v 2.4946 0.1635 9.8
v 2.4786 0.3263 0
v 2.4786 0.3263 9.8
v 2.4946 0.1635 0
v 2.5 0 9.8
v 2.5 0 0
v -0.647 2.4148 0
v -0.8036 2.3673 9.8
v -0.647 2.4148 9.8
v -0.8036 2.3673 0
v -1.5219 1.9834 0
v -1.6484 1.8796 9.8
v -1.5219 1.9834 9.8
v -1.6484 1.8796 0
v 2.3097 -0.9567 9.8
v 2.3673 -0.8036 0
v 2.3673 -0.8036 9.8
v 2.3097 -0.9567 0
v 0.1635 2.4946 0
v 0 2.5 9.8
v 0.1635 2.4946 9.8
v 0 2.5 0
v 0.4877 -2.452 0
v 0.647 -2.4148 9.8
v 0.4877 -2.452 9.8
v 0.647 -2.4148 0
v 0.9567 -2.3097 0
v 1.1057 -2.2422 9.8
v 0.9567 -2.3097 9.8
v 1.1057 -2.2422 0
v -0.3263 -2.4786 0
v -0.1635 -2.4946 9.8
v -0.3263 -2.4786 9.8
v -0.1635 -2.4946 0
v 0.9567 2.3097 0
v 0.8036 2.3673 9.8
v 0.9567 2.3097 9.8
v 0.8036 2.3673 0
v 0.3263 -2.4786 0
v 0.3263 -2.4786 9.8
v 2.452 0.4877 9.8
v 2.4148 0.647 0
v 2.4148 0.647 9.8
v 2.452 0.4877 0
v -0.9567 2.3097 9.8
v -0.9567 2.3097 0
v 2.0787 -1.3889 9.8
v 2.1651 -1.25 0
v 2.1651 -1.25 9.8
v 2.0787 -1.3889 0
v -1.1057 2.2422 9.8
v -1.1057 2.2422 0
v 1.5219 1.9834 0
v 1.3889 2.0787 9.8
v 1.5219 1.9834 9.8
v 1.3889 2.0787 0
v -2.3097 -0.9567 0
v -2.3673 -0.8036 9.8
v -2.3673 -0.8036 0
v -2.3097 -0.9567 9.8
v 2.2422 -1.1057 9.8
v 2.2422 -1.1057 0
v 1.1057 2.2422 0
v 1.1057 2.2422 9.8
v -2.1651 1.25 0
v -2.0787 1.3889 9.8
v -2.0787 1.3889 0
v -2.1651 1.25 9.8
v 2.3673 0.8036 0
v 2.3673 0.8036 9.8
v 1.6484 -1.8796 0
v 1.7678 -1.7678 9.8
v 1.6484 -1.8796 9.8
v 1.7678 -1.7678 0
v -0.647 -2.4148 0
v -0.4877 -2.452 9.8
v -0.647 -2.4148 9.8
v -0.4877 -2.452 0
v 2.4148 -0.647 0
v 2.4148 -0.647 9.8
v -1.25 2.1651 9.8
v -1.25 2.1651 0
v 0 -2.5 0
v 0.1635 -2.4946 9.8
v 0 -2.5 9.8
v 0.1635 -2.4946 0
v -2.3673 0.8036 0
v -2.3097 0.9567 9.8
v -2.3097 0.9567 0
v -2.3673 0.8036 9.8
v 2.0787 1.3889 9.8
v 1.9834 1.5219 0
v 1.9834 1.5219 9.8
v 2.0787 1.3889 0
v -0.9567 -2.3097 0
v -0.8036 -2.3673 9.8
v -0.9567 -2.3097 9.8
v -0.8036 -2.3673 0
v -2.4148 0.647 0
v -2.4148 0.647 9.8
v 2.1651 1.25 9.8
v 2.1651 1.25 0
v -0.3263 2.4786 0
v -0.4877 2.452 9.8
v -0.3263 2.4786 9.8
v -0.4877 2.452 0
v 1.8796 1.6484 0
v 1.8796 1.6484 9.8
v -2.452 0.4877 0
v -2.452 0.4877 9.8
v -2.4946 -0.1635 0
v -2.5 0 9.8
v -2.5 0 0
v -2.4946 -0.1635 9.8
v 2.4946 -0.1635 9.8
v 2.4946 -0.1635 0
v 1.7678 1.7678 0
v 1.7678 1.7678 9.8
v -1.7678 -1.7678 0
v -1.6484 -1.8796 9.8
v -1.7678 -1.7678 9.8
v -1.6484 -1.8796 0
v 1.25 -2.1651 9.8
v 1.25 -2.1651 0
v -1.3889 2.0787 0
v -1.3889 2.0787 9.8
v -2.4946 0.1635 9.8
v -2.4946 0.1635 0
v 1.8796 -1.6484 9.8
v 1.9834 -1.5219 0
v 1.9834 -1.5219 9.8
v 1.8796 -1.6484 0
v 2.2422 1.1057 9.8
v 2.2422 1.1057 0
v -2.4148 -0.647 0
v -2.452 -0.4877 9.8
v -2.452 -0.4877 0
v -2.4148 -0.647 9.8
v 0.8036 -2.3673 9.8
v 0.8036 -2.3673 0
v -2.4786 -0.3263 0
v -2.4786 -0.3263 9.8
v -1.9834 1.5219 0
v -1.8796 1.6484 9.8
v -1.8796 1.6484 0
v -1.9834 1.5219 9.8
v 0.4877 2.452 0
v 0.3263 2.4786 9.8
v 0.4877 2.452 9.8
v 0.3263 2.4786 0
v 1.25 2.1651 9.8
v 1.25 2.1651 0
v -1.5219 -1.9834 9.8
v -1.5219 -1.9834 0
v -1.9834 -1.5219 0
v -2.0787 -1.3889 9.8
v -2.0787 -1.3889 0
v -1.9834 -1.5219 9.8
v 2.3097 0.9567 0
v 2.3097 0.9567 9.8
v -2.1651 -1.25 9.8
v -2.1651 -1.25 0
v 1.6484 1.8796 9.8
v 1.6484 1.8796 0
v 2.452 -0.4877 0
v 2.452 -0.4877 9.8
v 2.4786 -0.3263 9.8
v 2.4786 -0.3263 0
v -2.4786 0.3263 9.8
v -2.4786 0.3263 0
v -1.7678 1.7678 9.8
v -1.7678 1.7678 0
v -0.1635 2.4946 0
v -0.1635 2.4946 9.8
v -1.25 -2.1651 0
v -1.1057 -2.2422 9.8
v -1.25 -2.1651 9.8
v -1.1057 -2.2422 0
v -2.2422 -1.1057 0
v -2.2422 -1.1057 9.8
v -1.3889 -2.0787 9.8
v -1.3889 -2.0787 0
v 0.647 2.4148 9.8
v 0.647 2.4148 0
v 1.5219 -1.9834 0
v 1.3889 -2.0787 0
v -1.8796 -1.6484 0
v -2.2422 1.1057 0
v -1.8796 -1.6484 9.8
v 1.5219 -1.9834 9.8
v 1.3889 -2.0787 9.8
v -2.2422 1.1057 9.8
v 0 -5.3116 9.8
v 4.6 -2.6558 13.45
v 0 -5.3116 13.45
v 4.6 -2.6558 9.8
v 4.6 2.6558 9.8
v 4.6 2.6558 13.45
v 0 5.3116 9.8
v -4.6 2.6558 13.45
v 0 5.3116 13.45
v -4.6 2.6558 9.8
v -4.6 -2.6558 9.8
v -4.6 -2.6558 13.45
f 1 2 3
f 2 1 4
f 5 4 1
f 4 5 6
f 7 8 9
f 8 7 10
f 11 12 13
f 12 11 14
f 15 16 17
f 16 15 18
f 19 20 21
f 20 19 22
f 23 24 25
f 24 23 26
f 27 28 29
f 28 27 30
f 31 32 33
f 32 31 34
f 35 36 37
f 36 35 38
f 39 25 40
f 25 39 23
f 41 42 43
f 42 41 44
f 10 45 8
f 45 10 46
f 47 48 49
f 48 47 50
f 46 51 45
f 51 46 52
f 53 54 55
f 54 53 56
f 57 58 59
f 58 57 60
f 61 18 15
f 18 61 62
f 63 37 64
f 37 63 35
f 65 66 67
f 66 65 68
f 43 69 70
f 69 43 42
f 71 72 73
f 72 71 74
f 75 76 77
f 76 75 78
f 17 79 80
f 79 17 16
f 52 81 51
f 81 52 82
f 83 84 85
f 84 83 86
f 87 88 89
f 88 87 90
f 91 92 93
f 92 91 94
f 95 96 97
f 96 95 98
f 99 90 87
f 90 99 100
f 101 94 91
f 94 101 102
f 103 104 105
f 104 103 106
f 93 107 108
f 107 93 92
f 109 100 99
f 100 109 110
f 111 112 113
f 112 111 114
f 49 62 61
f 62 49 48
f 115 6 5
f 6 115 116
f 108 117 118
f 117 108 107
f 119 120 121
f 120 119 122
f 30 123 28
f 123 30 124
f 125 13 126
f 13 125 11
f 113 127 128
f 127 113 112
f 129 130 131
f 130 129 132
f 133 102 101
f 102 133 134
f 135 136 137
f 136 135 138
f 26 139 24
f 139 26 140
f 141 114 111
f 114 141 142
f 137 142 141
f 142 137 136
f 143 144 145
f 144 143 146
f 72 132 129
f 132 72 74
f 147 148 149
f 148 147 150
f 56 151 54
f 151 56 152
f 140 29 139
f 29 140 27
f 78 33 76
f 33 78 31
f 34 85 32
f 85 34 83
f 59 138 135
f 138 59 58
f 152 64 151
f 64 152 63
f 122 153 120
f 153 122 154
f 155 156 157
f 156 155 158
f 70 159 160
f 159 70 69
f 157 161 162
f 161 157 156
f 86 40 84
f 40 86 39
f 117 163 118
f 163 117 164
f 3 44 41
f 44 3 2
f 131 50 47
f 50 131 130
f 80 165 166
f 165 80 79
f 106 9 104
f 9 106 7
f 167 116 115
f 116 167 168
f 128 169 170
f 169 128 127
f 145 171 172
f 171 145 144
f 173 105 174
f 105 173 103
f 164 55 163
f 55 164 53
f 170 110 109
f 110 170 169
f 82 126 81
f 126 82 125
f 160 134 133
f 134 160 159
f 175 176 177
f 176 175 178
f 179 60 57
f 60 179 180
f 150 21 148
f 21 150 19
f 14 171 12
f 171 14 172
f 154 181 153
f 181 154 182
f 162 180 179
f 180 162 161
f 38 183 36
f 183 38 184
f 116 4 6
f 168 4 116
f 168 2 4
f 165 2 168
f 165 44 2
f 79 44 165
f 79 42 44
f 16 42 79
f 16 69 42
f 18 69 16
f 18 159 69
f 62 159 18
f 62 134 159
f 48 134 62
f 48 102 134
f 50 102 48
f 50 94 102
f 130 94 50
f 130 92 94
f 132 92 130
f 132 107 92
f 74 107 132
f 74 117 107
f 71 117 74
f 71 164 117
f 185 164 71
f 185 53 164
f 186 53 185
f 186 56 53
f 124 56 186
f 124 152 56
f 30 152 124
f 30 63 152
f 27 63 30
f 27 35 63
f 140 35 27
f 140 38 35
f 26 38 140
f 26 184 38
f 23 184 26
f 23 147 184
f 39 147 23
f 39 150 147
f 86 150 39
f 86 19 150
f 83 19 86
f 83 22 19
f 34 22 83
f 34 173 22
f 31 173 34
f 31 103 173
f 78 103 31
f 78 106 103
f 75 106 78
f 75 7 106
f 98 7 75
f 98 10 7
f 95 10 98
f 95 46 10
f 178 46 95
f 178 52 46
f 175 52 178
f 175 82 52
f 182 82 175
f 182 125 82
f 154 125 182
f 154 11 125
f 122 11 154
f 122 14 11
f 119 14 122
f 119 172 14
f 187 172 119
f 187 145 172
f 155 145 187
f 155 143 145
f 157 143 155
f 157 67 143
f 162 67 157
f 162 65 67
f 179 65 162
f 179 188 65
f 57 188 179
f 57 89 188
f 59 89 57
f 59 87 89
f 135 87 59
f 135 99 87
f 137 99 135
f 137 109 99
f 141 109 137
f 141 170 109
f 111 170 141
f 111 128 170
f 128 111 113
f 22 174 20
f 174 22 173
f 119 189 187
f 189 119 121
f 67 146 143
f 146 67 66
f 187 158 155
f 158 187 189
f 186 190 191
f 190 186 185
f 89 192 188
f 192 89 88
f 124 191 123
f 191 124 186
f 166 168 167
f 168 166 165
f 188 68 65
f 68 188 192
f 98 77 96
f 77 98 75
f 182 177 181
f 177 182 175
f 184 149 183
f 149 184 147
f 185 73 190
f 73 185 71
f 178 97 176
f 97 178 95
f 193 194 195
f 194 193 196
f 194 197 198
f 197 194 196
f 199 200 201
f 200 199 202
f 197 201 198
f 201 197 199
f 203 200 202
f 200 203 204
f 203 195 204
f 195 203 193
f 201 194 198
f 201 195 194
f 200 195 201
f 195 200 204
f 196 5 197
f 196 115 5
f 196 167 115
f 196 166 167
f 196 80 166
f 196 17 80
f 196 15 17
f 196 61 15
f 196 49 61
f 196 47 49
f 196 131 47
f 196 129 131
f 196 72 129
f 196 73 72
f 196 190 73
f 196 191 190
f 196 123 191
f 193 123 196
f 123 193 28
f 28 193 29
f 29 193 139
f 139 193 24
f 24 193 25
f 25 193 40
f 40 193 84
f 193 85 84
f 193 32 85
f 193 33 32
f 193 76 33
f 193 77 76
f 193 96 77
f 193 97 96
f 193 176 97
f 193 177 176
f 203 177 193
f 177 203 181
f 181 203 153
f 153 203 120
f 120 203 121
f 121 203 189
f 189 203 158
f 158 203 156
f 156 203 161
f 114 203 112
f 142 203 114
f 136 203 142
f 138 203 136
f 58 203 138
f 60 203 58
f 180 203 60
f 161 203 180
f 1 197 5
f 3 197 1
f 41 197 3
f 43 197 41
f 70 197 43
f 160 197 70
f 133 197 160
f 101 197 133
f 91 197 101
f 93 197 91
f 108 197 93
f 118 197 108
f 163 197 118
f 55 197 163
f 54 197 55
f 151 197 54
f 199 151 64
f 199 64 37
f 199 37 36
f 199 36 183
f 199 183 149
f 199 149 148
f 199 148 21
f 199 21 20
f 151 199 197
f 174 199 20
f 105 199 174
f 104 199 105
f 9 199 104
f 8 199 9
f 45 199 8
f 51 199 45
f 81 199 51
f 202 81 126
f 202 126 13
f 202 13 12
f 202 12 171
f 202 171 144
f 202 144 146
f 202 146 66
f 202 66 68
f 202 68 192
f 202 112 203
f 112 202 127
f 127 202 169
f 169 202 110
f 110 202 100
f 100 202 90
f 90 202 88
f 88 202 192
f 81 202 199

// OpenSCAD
// Hex head screw: shaft d=5.0mm, shaft length=10mm
// Hex head: across flats=9.2mm, head height=3.65mm

shaft_d = 5.0;
shaft_l = 10.0;

head_af = 9.2;          // across flats
head_h  = 3.65;

overlap = 0.2;          // small overlap to guarantee a single connected solid

module screw_shaft(d=shaft_d, h=shaft_l) {
    cylinder(d=d, h=h, center=false, $fn=96);
}

module hex_head(af=head_af, h=head_h) {
    // For a regular hexagon made with $fn=6, cylinder(d=...) is across corners.
    // Convert across-flats (AF) to across-corners (AC): AC = AF / cos(30°)
    ac = af / cos(30);

    rotate([0, 0, 30])  // orient so flats are horizontal/vertical in standard views
        cylinder(d=ac, h=h, center=false, $fn=6);
}

module hex_head_screw() {
    union() {
        screw_shaft();
        translate([0, 0, shaft_l - overlap])
            hex_head();
    }
}

hex_head_screw();
